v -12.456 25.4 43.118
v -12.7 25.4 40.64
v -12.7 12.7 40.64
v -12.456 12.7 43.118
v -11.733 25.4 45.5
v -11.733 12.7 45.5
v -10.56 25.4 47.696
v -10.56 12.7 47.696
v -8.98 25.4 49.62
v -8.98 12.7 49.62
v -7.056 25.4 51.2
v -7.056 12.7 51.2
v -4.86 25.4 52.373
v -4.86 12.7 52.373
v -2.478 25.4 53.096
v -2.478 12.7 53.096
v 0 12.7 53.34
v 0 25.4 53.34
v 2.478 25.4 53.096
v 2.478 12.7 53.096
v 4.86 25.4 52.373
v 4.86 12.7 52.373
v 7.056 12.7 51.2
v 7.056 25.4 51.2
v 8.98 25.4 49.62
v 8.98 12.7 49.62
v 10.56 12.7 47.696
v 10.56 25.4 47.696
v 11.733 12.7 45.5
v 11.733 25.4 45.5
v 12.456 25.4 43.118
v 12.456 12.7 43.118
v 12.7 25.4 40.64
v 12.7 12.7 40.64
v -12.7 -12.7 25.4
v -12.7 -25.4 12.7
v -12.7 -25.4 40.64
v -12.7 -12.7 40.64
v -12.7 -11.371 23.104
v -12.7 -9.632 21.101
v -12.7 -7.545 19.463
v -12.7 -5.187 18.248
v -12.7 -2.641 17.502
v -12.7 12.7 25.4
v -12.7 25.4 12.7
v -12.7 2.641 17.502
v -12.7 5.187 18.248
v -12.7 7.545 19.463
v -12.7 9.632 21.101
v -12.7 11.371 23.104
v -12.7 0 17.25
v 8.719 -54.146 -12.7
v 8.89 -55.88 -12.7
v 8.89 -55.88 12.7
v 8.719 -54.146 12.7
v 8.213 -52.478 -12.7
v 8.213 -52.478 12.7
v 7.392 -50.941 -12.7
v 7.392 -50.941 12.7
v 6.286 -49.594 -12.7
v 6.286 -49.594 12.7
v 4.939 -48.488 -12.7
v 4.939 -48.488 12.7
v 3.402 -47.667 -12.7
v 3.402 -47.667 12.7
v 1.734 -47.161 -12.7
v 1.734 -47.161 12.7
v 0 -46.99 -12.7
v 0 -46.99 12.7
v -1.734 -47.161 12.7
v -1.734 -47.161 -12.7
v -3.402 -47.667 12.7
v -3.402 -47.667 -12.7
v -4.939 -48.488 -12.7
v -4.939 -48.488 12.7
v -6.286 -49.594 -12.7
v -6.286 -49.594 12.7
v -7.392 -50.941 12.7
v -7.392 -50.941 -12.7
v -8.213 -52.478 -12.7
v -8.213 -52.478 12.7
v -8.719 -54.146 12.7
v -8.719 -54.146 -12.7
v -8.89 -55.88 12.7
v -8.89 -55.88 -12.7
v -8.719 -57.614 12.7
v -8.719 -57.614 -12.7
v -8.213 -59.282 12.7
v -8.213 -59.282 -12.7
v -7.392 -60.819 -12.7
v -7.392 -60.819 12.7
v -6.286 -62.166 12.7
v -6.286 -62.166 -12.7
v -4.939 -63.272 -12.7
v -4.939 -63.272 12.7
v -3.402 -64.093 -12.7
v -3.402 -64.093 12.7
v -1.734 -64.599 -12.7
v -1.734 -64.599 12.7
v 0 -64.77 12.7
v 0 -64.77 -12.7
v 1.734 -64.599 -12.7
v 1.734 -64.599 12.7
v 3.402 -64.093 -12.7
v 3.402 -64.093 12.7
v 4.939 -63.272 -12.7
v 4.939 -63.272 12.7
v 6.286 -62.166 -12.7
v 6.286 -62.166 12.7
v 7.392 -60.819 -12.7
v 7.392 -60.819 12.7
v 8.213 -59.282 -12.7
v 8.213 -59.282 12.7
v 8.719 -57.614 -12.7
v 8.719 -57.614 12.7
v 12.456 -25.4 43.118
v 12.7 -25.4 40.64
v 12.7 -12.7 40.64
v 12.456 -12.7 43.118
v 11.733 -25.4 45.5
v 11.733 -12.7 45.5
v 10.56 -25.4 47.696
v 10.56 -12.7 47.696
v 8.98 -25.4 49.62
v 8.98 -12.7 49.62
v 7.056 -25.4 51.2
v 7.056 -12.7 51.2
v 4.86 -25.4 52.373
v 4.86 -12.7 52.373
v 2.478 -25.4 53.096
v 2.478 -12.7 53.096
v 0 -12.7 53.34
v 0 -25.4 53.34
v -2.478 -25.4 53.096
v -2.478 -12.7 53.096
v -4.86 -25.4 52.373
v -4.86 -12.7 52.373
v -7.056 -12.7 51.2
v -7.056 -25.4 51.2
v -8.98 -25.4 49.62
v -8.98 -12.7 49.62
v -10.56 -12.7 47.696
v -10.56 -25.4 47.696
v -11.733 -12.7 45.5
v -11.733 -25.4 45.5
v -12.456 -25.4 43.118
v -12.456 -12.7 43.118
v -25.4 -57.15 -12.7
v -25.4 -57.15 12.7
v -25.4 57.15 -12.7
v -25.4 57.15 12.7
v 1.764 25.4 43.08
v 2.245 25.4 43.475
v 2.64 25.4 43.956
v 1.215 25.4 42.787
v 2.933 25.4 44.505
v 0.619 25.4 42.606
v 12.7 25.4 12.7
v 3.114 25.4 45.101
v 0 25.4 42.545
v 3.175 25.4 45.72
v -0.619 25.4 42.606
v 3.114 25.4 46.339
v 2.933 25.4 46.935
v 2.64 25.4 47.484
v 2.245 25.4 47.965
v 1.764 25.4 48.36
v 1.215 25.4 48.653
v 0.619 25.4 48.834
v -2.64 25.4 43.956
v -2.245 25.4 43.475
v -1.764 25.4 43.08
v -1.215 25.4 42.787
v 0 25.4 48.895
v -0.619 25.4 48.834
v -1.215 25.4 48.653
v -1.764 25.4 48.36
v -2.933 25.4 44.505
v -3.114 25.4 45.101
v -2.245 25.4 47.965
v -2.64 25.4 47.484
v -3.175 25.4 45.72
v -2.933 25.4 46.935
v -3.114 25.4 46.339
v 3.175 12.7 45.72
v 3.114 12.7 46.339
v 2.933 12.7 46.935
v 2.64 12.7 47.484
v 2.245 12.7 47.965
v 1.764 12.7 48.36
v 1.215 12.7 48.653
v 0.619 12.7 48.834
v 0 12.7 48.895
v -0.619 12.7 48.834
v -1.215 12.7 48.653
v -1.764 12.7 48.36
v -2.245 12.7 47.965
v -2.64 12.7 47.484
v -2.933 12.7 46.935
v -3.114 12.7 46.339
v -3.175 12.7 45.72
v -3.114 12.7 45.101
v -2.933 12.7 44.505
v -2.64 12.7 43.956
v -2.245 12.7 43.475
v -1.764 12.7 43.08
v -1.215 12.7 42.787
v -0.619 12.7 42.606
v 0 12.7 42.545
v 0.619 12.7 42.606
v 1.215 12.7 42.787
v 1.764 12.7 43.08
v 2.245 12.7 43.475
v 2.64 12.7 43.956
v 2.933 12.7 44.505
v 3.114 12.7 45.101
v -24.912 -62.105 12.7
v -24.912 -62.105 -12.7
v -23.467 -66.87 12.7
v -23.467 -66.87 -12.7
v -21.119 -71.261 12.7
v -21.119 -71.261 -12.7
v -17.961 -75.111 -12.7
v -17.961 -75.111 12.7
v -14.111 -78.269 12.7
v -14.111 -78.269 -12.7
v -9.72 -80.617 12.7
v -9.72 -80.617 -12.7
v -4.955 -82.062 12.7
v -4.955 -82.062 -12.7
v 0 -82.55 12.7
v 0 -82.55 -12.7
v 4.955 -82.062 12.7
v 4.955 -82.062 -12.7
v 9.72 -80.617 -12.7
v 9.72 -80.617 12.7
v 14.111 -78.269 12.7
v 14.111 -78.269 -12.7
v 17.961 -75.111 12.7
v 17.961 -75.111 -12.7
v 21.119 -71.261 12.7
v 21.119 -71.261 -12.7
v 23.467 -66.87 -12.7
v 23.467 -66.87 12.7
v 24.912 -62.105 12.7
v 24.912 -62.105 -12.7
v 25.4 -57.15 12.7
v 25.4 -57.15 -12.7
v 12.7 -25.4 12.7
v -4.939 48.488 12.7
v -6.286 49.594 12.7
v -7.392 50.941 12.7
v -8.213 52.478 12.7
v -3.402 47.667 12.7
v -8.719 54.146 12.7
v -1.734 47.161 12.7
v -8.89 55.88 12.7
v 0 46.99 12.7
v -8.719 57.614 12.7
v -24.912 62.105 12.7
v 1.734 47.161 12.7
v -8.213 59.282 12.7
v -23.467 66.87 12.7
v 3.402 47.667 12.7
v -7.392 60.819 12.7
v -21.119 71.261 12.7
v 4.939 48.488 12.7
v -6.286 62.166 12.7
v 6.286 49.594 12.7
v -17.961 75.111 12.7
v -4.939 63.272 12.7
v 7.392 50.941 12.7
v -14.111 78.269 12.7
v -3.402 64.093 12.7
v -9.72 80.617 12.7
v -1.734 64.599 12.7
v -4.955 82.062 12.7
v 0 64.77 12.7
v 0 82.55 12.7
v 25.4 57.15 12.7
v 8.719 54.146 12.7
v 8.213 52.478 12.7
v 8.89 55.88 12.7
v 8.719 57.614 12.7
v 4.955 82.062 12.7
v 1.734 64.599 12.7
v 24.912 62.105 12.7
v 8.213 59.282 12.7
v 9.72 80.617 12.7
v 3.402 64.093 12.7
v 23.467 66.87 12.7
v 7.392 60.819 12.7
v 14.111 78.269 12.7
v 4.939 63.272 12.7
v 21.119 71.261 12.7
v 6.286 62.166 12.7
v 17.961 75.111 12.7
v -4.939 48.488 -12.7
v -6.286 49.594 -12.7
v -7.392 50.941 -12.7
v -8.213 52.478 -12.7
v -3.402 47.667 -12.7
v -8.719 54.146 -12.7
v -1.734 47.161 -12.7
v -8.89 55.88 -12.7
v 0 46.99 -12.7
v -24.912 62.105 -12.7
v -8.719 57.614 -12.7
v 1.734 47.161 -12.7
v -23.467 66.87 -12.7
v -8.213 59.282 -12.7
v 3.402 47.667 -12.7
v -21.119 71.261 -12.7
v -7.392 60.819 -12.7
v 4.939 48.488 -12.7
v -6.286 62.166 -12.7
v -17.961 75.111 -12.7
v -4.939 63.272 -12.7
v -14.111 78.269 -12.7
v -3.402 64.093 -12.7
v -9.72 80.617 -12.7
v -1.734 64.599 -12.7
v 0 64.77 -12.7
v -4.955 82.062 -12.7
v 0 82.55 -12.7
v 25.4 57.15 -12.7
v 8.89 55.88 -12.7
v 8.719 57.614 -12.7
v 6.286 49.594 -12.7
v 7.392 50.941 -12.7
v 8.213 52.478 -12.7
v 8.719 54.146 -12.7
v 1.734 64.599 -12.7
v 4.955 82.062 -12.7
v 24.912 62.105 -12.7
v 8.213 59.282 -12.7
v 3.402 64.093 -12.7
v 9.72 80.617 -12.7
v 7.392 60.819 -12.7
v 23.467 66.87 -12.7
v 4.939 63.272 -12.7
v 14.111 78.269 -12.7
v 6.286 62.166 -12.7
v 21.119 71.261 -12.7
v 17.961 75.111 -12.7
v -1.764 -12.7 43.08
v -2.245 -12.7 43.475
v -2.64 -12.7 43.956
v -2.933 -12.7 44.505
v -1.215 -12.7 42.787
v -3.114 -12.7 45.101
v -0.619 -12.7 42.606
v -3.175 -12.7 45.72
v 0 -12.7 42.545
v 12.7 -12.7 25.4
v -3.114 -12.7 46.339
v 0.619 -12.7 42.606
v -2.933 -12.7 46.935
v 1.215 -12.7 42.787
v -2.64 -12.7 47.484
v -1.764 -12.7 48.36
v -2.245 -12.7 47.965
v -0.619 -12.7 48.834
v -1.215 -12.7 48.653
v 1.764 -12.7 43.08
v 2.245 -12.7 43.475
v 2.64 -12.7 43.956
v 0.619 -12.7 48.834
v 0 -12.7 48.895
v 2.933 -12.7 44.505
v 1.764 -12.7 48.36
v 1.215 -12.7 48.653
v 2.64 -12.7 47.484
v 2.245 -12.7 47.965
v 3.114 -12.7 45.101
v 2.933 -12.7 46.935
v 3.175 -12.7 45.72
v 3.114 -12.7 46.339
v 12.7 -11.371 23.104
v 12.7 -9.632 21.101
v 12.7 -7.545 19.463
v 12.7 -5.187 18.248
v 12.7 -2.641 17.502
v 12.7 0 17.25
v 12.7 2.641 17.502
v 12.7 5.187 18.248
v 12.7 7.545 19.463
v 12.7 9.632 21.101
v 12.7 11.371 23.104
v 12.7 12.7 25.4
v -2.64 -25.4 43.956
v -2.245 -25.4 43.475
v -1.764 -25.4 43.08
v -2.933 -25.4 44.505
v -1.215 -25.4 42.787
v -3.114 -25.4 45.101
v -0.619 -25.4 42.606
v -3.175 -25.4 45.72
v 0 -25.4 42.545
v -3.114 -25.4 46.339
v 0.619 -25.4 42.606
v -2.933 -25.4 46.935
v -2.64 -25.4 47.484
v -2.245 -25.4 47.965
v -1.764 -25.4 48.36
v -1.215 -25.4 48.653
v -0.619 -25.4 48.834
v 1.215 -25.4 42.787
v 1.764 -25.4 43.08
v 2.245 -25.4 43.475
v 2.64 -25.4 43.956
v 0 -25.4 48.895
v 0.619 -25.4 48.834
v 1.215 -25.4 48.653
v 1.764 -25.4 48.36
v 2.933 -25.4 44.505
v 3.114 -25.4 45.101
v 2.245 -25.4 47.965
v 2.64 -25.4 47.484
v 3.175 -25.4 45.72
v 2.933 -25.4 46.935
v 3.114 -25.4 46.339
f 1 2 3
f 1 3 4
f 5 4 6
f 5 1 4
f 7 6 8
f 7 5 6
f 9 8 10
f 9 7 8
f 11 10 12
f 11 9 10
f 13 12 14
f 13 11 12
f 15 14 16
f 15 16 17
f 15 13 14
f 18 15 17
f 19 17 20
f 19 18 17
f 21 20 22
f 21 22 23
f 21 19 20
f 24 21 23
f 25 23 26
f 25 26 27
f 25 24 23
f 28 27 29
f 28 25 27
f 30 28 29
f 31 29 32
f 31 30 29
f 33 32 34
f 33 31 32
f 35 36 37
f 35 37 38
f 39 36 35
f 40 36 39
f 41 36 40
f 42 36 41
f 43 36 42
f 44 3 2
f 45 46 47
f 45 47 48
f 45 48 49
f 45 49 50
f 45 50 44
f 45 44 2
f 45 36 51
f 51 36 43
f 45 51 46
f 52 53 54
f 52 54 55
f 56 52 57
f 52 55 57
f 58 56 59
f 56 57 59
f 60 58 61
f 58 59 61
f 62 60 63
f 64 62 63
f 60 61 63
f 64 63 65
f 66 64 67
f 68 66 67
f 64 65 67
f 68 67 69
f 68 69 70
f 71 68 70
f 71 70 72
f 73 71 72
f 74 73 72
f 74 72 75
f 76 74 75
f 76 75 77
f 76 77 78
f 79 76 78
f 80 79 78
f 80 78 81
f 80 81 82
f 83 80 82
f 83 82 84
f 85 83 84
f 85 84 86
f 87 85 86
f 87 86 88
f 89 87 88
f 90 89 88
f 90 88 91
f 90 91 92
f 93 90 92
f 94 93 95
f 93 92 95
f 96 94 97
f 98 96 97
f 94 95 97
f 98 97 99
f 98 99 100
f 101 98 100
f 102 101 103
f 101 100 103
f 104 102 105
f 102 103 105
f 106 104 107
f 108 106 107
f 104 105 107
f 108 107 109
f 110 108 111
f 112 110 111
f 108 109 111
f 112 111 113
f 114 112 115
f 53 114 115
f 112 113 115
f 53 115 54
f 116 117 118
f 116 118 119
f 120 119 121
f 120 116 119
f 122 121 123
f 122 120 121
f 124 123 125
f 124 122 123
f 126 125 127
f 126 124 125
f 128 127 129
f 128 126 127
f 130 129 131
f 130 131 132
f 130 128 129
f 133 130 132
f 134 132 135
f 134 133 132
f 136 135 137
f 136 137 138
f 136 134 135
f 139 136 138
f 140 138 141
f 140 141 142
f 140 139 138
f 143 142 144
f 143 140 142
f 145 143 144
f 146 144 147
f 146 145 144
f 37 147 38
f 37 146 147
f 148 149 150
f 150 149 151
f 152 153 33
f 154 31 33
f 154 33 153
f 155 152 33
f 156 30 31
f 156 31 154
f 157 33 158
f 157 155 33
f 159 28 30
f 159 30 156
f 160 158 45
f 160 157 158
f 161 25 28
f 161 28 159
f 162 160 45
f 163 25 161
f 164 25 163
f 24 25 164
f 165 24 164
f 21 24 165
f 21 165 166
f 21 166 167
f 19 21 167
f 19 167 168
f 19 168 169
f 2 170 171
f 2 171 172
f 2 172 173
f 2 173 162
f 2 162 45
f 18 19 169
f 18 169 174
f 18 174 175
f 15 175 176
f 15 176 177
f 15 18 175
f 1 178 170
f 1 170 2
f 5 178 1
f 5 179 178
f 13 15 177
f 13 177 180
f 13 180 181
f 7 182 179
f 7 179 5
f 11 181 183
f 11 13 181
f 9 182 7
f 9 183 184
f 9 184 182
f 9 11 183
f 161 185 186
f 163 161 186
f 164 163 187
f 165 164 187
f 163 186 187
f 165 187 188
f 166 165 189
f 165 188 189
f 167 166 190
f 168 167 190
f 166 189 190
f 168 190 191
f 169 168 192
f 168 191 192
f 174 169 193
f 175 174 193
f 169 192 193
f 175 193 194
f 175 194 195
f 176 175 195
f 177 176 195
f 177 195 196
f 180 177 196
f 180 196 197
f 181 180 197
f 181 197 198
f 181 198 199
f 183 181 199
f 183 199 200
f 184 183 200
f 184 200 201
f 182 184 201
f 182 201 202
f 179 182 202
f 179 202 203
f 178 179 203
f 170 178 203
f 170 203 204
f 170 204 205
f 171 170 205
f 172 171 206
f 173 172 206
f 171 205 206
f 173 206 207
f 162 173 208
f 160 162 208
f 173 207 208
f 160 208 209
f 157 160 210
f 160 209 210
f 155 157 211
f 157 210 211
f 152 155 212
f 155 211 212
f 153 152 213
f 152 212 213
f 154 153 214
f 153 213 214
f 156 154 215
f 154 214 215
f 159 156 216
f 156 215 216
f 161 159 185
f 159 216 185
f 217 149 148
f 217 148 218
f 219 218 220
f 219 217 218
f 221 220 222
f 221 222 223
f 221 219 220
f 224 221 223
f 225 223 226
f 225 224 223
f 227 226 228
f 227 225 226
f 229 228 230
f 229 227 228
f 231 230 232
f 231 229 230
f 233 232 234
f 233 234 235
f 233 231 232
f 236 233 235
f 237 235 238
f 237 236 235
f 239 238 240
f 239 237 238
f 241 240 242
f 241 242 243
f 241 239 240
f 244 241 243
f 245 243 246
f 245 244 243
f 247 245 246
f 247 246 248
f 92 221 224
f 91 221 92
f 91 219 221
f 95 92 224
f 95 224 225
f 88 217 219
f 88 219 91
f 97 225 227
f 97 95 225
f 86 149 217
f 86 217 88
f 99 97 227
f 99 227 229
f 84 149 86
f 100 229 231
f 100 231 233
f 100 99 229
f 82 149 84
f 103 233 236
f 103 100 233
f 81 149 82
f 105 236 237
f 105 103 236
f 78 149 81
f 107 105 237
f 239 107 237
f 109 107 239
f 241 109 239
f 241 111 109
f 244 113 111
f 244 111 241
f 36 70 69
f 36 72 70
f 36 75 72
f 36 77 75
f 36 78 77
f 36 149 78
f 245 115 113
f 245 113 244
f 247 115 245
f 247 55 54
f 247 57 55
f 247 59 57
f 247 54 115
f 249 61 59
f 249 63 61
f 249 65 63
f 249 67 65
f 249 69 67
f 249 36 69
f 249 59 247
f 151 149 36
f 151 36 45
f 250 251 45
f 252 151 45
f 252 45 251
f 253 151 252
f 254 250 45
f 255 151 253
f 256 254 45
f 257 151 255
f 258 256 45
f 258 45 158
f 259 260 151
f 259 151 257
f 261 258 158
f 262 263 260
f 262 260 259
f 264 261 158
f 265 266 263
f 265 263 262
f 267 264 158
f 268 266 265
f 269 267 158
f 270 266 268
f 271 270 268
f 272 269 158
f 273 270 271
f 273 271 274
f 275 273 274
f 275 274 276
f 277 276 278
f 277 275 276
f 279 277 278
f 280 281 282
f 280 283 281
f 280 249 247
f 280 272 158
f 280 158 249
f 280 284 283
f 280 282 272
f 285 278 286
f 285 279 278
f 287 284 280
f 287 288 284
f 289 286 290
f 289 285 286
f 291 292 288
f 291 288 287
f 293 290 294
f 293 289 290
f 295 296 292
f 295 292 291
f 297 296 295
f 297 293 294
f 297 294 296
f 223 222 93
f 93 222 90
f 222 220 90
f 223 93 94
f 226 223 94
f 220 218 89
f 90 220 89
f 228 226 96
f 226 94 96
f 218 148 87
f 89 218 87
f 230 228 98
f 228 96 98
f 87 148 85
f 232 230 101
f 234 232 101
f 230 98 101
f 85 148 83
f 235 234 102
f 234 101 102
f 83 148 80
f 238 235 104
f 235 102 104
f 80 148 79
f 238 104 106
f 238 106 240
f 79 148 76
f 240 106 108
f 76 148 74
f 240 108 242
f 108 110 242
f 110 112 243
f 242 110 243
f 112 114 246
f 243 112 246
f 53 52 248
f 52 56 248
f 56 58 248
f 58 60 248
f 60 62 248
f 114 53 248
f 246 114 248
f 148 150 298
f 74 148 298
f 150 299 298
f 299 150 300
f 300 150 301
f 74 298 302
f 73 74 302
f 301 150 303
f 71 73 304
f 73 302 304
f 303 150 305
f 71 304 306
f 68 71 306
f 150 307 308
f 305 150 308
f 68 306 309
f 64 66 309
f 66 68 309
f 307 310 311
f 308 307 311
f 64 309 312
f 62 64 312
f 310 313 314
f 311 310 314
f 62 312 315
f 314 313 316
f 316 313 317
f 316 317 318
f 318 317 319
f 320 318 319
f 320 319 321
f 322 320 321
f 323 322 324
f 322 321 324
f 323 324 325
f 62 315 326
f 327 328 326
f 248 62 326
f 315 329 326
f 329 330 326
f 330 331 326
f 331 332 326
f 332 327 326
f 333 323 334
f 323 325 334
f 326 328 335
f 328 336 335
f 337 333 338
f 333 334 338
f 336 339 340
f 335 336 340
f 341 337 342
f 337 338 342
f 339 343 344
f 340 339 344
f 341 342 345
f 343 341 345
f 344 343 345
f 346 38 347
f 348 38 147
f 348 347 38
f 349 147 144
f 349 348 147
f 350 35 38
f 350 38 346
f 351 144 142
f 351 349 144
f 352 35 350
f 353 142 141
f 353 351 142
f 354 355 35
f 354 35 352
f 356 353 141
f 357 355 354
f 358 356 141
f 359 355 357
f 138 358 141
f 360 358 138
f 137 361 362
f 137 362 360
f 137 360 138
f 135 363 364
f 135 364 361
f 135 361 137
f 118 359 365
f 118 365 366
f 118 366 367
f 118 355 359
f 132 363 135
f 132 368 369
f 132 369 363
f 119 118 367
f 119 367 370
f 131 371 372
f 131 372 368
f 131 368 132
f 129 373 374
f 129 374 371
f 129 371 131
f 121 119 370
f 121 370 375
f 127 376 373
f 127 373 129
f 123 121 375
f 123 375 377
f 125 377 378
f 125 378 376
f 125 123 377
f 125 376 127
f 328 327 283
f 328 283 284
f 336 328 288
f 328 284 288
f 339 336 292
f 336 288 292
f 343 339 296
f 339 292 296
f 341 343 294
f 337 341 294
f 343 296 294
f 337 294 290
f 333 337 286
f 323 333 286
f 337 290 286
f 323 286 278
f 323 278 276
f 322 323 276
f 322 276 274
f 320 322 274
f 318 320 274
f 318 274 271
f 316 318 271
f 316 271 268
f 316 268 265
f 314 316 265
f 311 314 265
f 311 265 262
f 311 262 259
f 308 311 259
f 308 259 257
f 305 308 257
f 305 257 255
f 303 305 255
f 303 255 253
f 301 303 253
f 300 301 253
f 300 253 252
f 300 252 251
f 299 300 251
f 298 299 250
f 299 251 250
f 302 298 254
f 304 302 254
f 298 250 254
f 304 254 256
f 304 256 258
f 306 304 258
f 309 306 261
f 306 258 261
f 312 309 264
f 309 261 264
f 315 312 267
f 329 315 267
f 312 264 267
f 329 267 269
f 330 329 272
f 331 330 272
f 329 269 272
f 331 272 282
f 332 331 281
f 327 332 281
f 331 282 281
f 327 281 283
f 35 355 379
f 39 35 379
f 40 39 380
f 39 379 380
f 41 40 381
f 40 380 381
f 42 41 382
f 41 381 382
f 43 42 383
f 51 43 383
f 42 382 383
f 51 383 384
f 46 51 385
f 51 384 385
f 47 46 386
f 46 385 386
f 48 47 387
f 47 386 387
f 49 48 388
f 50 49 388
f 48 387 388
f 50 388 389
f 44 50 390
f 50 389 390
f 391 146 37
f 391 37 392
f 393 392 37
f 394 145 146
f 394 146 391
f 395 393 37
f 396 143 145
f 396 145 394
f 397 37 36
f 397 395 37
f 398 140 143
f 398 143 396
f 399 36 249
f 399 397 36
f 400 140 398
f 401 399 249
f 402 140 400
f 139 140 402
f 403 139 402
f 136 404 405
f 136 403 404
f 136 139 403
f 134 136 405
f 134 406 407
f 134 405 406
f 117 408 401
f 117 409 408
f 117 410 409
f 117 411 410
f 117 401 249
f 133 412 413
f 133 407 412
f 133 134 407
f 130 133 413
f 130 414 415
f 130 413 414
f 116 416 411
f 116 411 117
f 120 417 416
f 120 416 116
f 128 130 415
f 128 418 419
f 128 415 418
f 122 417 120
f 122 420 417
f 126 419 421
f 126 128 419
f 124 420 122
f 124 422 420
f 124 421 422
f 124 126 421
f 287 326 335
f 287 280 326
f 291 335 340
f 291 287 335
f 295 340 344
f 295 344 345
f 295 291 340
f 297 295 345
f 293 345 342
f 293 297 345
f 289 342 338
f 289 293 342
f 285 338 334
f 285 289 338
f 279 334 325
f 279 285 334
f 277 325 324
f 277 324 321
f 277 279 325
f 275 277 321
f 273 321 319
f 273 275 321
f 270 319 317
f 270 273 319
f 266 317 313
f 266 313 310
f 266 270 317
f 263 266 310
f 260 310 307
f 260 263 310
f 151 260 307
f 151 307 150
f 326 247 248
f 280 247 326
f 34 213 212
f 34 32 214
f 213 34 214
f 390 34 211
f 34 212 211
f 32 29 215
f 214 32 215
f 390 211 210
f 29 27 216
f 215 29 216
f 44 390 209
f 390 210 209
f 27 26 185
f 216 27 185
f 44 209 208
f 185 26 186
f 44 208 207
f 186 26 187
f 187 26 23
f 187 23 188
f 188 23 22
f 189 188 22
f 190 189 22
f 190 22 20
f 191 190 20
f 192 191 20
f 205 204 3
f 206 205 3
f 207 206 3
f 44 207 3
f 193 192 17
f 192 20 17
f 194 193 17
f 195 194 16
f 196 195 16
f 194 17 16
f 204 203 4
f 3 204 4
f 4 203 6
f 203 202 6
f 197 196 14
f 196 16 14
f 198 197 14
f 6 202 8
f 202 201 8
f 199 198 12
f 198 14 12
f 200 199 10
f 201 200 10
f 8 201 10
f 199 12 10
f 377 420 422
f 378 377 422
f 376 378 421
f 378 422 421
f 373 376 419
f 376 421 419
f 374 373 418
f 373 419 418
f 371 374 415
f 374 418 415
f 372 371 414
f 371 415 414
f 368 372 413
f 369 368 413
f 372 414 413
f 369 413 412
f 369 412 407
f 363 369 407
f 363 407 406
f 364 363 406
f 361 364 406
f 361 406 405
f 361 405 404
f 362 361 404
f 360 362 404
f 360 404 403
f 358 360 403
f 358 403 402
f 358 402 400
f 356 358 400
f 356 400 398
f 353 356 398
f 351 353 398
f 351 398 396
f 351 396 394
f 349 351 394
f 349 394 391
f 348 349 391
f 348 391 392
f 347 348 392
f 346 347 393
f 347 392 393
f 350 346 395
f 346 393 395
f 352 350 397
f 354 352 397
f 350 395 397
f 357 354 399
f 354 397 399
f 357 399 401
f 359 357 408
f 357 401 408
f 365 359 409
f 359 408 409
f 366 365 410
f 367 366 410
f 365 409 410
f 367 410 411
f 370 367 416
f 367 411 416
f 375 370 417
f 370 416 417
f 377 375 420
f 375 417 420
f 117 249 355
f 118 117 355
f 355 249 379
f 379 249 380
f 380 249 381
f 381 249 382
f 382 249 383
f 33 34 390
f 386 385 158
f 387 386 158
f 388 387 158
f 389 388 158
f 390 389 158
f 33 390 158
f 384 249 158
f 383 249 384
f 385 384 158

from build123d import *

# Parameters (mm, degrees)
F0_W      = 50.8
F0_H      = 114.3
F1_DEPTH  = 12.7
F2_R      = 8.89
F3_DEPTH  = 63.5
F4_W      = 25.4
F4_H      = 50.8
F5_DEPTH  = 27.94
F8_DEPTH  = 12.7
F9_DEPTH  = 12.7
F10_R     = 3.175
F11_DEPTH = 76.2
F12_W     = 25.4
F12_H     = 15.24
F13_DEPTH = 76.2


with BuildPart() as f1:
    # F0 (on Top) → F1 (new body, symmetric)
    with BuildSketch(Plane.XY):
        with BuildLine():
            Line((-25.4, 57.15), (25.4, 57.15))
            ThreePointArc((25.4, 57.15), (0, 82.55), (-25.4, 57.15))
        make_face()
        Rectangle(F0_W, F0_H)
        with BuildLine():
            ThreePointArc((-25.4, -57.15), (0, -82.55), (25.4, -57.15))
            Line((25.4, -57.15), (-25.4, -57.15))
        make_face()
    extrude(amount=F1_DEPTH, both=True)

    # F2 (on face) → F3 (cut)
    with BuildSketch(Plane.XY.offset(12.7)):
        with Locations((0, 55.88)):
            Circle(F2_R)
        with Locations((0, -55.88)):
            Circle(F2_R)
    extrude(amount=-F3_DEPTH, mode=Mode.SUBTRACT)

    # F4 (on face) → F5 (join)
    with BuildSketch(Plane.XY.offset(12.7)):
        Rectangle(F4_W, F4_H)
    extrude(amount=F5_DEPTH)

    # F7 (on face) → F8 (join)
    with BuildSketch(Plane.XZ.offset(25.4)):
        with BuildLine():
            Line((-12.7, 40.64), (12.7, 40.64))
            ThreePointArc((12.7, 40.64), (0, 53.34), (-12.7, 40.64))
        make_face()
    extrude(amount=-F8_DEPTH)

    # F6 (on face) → F9 (join)
    with BuildSketch(Plane(origin=(0, 25.4, 0), x_dir=(-1, 0, 0), z_dir=(0, 1, 0))):
        with BuildLine():
            Line((-12.7, 40.64), (12.7, 40.64))
            ThreePointArc((12.7, 40.64), (0, 53.34), (-12.7, 40.64))
        make_face()
    extrude(amount=-F9_DEPTH)

    # F10 (on face) → F11 (cut)
    with BuildSketch(Plane.XZ.offset(25.4)):
        with Locations((0, 45.72)):
            Circle(F10_R)
    extrude(amount=-F11_DEPTH, mode=Mode.SUBTRACT)

    # F12 (on face) → F13 (cut)
    with BuildSketch(Plane.YZ.offset(12.7)):
        with Locations((0, 33.02)):
            Rectangle(F12_W, F12_H)
        with BuildLine():
            ThreePointArc((-12.7, 25.4), (0, 17.249871), (12.7, 25.4))
            Line((12.7, 25.4), (-12.7, 25.4))
        make_face()
    extrude(amount=-F13_DEPTH, mode=Mode.SUBTRACT)


solid = f1.part
